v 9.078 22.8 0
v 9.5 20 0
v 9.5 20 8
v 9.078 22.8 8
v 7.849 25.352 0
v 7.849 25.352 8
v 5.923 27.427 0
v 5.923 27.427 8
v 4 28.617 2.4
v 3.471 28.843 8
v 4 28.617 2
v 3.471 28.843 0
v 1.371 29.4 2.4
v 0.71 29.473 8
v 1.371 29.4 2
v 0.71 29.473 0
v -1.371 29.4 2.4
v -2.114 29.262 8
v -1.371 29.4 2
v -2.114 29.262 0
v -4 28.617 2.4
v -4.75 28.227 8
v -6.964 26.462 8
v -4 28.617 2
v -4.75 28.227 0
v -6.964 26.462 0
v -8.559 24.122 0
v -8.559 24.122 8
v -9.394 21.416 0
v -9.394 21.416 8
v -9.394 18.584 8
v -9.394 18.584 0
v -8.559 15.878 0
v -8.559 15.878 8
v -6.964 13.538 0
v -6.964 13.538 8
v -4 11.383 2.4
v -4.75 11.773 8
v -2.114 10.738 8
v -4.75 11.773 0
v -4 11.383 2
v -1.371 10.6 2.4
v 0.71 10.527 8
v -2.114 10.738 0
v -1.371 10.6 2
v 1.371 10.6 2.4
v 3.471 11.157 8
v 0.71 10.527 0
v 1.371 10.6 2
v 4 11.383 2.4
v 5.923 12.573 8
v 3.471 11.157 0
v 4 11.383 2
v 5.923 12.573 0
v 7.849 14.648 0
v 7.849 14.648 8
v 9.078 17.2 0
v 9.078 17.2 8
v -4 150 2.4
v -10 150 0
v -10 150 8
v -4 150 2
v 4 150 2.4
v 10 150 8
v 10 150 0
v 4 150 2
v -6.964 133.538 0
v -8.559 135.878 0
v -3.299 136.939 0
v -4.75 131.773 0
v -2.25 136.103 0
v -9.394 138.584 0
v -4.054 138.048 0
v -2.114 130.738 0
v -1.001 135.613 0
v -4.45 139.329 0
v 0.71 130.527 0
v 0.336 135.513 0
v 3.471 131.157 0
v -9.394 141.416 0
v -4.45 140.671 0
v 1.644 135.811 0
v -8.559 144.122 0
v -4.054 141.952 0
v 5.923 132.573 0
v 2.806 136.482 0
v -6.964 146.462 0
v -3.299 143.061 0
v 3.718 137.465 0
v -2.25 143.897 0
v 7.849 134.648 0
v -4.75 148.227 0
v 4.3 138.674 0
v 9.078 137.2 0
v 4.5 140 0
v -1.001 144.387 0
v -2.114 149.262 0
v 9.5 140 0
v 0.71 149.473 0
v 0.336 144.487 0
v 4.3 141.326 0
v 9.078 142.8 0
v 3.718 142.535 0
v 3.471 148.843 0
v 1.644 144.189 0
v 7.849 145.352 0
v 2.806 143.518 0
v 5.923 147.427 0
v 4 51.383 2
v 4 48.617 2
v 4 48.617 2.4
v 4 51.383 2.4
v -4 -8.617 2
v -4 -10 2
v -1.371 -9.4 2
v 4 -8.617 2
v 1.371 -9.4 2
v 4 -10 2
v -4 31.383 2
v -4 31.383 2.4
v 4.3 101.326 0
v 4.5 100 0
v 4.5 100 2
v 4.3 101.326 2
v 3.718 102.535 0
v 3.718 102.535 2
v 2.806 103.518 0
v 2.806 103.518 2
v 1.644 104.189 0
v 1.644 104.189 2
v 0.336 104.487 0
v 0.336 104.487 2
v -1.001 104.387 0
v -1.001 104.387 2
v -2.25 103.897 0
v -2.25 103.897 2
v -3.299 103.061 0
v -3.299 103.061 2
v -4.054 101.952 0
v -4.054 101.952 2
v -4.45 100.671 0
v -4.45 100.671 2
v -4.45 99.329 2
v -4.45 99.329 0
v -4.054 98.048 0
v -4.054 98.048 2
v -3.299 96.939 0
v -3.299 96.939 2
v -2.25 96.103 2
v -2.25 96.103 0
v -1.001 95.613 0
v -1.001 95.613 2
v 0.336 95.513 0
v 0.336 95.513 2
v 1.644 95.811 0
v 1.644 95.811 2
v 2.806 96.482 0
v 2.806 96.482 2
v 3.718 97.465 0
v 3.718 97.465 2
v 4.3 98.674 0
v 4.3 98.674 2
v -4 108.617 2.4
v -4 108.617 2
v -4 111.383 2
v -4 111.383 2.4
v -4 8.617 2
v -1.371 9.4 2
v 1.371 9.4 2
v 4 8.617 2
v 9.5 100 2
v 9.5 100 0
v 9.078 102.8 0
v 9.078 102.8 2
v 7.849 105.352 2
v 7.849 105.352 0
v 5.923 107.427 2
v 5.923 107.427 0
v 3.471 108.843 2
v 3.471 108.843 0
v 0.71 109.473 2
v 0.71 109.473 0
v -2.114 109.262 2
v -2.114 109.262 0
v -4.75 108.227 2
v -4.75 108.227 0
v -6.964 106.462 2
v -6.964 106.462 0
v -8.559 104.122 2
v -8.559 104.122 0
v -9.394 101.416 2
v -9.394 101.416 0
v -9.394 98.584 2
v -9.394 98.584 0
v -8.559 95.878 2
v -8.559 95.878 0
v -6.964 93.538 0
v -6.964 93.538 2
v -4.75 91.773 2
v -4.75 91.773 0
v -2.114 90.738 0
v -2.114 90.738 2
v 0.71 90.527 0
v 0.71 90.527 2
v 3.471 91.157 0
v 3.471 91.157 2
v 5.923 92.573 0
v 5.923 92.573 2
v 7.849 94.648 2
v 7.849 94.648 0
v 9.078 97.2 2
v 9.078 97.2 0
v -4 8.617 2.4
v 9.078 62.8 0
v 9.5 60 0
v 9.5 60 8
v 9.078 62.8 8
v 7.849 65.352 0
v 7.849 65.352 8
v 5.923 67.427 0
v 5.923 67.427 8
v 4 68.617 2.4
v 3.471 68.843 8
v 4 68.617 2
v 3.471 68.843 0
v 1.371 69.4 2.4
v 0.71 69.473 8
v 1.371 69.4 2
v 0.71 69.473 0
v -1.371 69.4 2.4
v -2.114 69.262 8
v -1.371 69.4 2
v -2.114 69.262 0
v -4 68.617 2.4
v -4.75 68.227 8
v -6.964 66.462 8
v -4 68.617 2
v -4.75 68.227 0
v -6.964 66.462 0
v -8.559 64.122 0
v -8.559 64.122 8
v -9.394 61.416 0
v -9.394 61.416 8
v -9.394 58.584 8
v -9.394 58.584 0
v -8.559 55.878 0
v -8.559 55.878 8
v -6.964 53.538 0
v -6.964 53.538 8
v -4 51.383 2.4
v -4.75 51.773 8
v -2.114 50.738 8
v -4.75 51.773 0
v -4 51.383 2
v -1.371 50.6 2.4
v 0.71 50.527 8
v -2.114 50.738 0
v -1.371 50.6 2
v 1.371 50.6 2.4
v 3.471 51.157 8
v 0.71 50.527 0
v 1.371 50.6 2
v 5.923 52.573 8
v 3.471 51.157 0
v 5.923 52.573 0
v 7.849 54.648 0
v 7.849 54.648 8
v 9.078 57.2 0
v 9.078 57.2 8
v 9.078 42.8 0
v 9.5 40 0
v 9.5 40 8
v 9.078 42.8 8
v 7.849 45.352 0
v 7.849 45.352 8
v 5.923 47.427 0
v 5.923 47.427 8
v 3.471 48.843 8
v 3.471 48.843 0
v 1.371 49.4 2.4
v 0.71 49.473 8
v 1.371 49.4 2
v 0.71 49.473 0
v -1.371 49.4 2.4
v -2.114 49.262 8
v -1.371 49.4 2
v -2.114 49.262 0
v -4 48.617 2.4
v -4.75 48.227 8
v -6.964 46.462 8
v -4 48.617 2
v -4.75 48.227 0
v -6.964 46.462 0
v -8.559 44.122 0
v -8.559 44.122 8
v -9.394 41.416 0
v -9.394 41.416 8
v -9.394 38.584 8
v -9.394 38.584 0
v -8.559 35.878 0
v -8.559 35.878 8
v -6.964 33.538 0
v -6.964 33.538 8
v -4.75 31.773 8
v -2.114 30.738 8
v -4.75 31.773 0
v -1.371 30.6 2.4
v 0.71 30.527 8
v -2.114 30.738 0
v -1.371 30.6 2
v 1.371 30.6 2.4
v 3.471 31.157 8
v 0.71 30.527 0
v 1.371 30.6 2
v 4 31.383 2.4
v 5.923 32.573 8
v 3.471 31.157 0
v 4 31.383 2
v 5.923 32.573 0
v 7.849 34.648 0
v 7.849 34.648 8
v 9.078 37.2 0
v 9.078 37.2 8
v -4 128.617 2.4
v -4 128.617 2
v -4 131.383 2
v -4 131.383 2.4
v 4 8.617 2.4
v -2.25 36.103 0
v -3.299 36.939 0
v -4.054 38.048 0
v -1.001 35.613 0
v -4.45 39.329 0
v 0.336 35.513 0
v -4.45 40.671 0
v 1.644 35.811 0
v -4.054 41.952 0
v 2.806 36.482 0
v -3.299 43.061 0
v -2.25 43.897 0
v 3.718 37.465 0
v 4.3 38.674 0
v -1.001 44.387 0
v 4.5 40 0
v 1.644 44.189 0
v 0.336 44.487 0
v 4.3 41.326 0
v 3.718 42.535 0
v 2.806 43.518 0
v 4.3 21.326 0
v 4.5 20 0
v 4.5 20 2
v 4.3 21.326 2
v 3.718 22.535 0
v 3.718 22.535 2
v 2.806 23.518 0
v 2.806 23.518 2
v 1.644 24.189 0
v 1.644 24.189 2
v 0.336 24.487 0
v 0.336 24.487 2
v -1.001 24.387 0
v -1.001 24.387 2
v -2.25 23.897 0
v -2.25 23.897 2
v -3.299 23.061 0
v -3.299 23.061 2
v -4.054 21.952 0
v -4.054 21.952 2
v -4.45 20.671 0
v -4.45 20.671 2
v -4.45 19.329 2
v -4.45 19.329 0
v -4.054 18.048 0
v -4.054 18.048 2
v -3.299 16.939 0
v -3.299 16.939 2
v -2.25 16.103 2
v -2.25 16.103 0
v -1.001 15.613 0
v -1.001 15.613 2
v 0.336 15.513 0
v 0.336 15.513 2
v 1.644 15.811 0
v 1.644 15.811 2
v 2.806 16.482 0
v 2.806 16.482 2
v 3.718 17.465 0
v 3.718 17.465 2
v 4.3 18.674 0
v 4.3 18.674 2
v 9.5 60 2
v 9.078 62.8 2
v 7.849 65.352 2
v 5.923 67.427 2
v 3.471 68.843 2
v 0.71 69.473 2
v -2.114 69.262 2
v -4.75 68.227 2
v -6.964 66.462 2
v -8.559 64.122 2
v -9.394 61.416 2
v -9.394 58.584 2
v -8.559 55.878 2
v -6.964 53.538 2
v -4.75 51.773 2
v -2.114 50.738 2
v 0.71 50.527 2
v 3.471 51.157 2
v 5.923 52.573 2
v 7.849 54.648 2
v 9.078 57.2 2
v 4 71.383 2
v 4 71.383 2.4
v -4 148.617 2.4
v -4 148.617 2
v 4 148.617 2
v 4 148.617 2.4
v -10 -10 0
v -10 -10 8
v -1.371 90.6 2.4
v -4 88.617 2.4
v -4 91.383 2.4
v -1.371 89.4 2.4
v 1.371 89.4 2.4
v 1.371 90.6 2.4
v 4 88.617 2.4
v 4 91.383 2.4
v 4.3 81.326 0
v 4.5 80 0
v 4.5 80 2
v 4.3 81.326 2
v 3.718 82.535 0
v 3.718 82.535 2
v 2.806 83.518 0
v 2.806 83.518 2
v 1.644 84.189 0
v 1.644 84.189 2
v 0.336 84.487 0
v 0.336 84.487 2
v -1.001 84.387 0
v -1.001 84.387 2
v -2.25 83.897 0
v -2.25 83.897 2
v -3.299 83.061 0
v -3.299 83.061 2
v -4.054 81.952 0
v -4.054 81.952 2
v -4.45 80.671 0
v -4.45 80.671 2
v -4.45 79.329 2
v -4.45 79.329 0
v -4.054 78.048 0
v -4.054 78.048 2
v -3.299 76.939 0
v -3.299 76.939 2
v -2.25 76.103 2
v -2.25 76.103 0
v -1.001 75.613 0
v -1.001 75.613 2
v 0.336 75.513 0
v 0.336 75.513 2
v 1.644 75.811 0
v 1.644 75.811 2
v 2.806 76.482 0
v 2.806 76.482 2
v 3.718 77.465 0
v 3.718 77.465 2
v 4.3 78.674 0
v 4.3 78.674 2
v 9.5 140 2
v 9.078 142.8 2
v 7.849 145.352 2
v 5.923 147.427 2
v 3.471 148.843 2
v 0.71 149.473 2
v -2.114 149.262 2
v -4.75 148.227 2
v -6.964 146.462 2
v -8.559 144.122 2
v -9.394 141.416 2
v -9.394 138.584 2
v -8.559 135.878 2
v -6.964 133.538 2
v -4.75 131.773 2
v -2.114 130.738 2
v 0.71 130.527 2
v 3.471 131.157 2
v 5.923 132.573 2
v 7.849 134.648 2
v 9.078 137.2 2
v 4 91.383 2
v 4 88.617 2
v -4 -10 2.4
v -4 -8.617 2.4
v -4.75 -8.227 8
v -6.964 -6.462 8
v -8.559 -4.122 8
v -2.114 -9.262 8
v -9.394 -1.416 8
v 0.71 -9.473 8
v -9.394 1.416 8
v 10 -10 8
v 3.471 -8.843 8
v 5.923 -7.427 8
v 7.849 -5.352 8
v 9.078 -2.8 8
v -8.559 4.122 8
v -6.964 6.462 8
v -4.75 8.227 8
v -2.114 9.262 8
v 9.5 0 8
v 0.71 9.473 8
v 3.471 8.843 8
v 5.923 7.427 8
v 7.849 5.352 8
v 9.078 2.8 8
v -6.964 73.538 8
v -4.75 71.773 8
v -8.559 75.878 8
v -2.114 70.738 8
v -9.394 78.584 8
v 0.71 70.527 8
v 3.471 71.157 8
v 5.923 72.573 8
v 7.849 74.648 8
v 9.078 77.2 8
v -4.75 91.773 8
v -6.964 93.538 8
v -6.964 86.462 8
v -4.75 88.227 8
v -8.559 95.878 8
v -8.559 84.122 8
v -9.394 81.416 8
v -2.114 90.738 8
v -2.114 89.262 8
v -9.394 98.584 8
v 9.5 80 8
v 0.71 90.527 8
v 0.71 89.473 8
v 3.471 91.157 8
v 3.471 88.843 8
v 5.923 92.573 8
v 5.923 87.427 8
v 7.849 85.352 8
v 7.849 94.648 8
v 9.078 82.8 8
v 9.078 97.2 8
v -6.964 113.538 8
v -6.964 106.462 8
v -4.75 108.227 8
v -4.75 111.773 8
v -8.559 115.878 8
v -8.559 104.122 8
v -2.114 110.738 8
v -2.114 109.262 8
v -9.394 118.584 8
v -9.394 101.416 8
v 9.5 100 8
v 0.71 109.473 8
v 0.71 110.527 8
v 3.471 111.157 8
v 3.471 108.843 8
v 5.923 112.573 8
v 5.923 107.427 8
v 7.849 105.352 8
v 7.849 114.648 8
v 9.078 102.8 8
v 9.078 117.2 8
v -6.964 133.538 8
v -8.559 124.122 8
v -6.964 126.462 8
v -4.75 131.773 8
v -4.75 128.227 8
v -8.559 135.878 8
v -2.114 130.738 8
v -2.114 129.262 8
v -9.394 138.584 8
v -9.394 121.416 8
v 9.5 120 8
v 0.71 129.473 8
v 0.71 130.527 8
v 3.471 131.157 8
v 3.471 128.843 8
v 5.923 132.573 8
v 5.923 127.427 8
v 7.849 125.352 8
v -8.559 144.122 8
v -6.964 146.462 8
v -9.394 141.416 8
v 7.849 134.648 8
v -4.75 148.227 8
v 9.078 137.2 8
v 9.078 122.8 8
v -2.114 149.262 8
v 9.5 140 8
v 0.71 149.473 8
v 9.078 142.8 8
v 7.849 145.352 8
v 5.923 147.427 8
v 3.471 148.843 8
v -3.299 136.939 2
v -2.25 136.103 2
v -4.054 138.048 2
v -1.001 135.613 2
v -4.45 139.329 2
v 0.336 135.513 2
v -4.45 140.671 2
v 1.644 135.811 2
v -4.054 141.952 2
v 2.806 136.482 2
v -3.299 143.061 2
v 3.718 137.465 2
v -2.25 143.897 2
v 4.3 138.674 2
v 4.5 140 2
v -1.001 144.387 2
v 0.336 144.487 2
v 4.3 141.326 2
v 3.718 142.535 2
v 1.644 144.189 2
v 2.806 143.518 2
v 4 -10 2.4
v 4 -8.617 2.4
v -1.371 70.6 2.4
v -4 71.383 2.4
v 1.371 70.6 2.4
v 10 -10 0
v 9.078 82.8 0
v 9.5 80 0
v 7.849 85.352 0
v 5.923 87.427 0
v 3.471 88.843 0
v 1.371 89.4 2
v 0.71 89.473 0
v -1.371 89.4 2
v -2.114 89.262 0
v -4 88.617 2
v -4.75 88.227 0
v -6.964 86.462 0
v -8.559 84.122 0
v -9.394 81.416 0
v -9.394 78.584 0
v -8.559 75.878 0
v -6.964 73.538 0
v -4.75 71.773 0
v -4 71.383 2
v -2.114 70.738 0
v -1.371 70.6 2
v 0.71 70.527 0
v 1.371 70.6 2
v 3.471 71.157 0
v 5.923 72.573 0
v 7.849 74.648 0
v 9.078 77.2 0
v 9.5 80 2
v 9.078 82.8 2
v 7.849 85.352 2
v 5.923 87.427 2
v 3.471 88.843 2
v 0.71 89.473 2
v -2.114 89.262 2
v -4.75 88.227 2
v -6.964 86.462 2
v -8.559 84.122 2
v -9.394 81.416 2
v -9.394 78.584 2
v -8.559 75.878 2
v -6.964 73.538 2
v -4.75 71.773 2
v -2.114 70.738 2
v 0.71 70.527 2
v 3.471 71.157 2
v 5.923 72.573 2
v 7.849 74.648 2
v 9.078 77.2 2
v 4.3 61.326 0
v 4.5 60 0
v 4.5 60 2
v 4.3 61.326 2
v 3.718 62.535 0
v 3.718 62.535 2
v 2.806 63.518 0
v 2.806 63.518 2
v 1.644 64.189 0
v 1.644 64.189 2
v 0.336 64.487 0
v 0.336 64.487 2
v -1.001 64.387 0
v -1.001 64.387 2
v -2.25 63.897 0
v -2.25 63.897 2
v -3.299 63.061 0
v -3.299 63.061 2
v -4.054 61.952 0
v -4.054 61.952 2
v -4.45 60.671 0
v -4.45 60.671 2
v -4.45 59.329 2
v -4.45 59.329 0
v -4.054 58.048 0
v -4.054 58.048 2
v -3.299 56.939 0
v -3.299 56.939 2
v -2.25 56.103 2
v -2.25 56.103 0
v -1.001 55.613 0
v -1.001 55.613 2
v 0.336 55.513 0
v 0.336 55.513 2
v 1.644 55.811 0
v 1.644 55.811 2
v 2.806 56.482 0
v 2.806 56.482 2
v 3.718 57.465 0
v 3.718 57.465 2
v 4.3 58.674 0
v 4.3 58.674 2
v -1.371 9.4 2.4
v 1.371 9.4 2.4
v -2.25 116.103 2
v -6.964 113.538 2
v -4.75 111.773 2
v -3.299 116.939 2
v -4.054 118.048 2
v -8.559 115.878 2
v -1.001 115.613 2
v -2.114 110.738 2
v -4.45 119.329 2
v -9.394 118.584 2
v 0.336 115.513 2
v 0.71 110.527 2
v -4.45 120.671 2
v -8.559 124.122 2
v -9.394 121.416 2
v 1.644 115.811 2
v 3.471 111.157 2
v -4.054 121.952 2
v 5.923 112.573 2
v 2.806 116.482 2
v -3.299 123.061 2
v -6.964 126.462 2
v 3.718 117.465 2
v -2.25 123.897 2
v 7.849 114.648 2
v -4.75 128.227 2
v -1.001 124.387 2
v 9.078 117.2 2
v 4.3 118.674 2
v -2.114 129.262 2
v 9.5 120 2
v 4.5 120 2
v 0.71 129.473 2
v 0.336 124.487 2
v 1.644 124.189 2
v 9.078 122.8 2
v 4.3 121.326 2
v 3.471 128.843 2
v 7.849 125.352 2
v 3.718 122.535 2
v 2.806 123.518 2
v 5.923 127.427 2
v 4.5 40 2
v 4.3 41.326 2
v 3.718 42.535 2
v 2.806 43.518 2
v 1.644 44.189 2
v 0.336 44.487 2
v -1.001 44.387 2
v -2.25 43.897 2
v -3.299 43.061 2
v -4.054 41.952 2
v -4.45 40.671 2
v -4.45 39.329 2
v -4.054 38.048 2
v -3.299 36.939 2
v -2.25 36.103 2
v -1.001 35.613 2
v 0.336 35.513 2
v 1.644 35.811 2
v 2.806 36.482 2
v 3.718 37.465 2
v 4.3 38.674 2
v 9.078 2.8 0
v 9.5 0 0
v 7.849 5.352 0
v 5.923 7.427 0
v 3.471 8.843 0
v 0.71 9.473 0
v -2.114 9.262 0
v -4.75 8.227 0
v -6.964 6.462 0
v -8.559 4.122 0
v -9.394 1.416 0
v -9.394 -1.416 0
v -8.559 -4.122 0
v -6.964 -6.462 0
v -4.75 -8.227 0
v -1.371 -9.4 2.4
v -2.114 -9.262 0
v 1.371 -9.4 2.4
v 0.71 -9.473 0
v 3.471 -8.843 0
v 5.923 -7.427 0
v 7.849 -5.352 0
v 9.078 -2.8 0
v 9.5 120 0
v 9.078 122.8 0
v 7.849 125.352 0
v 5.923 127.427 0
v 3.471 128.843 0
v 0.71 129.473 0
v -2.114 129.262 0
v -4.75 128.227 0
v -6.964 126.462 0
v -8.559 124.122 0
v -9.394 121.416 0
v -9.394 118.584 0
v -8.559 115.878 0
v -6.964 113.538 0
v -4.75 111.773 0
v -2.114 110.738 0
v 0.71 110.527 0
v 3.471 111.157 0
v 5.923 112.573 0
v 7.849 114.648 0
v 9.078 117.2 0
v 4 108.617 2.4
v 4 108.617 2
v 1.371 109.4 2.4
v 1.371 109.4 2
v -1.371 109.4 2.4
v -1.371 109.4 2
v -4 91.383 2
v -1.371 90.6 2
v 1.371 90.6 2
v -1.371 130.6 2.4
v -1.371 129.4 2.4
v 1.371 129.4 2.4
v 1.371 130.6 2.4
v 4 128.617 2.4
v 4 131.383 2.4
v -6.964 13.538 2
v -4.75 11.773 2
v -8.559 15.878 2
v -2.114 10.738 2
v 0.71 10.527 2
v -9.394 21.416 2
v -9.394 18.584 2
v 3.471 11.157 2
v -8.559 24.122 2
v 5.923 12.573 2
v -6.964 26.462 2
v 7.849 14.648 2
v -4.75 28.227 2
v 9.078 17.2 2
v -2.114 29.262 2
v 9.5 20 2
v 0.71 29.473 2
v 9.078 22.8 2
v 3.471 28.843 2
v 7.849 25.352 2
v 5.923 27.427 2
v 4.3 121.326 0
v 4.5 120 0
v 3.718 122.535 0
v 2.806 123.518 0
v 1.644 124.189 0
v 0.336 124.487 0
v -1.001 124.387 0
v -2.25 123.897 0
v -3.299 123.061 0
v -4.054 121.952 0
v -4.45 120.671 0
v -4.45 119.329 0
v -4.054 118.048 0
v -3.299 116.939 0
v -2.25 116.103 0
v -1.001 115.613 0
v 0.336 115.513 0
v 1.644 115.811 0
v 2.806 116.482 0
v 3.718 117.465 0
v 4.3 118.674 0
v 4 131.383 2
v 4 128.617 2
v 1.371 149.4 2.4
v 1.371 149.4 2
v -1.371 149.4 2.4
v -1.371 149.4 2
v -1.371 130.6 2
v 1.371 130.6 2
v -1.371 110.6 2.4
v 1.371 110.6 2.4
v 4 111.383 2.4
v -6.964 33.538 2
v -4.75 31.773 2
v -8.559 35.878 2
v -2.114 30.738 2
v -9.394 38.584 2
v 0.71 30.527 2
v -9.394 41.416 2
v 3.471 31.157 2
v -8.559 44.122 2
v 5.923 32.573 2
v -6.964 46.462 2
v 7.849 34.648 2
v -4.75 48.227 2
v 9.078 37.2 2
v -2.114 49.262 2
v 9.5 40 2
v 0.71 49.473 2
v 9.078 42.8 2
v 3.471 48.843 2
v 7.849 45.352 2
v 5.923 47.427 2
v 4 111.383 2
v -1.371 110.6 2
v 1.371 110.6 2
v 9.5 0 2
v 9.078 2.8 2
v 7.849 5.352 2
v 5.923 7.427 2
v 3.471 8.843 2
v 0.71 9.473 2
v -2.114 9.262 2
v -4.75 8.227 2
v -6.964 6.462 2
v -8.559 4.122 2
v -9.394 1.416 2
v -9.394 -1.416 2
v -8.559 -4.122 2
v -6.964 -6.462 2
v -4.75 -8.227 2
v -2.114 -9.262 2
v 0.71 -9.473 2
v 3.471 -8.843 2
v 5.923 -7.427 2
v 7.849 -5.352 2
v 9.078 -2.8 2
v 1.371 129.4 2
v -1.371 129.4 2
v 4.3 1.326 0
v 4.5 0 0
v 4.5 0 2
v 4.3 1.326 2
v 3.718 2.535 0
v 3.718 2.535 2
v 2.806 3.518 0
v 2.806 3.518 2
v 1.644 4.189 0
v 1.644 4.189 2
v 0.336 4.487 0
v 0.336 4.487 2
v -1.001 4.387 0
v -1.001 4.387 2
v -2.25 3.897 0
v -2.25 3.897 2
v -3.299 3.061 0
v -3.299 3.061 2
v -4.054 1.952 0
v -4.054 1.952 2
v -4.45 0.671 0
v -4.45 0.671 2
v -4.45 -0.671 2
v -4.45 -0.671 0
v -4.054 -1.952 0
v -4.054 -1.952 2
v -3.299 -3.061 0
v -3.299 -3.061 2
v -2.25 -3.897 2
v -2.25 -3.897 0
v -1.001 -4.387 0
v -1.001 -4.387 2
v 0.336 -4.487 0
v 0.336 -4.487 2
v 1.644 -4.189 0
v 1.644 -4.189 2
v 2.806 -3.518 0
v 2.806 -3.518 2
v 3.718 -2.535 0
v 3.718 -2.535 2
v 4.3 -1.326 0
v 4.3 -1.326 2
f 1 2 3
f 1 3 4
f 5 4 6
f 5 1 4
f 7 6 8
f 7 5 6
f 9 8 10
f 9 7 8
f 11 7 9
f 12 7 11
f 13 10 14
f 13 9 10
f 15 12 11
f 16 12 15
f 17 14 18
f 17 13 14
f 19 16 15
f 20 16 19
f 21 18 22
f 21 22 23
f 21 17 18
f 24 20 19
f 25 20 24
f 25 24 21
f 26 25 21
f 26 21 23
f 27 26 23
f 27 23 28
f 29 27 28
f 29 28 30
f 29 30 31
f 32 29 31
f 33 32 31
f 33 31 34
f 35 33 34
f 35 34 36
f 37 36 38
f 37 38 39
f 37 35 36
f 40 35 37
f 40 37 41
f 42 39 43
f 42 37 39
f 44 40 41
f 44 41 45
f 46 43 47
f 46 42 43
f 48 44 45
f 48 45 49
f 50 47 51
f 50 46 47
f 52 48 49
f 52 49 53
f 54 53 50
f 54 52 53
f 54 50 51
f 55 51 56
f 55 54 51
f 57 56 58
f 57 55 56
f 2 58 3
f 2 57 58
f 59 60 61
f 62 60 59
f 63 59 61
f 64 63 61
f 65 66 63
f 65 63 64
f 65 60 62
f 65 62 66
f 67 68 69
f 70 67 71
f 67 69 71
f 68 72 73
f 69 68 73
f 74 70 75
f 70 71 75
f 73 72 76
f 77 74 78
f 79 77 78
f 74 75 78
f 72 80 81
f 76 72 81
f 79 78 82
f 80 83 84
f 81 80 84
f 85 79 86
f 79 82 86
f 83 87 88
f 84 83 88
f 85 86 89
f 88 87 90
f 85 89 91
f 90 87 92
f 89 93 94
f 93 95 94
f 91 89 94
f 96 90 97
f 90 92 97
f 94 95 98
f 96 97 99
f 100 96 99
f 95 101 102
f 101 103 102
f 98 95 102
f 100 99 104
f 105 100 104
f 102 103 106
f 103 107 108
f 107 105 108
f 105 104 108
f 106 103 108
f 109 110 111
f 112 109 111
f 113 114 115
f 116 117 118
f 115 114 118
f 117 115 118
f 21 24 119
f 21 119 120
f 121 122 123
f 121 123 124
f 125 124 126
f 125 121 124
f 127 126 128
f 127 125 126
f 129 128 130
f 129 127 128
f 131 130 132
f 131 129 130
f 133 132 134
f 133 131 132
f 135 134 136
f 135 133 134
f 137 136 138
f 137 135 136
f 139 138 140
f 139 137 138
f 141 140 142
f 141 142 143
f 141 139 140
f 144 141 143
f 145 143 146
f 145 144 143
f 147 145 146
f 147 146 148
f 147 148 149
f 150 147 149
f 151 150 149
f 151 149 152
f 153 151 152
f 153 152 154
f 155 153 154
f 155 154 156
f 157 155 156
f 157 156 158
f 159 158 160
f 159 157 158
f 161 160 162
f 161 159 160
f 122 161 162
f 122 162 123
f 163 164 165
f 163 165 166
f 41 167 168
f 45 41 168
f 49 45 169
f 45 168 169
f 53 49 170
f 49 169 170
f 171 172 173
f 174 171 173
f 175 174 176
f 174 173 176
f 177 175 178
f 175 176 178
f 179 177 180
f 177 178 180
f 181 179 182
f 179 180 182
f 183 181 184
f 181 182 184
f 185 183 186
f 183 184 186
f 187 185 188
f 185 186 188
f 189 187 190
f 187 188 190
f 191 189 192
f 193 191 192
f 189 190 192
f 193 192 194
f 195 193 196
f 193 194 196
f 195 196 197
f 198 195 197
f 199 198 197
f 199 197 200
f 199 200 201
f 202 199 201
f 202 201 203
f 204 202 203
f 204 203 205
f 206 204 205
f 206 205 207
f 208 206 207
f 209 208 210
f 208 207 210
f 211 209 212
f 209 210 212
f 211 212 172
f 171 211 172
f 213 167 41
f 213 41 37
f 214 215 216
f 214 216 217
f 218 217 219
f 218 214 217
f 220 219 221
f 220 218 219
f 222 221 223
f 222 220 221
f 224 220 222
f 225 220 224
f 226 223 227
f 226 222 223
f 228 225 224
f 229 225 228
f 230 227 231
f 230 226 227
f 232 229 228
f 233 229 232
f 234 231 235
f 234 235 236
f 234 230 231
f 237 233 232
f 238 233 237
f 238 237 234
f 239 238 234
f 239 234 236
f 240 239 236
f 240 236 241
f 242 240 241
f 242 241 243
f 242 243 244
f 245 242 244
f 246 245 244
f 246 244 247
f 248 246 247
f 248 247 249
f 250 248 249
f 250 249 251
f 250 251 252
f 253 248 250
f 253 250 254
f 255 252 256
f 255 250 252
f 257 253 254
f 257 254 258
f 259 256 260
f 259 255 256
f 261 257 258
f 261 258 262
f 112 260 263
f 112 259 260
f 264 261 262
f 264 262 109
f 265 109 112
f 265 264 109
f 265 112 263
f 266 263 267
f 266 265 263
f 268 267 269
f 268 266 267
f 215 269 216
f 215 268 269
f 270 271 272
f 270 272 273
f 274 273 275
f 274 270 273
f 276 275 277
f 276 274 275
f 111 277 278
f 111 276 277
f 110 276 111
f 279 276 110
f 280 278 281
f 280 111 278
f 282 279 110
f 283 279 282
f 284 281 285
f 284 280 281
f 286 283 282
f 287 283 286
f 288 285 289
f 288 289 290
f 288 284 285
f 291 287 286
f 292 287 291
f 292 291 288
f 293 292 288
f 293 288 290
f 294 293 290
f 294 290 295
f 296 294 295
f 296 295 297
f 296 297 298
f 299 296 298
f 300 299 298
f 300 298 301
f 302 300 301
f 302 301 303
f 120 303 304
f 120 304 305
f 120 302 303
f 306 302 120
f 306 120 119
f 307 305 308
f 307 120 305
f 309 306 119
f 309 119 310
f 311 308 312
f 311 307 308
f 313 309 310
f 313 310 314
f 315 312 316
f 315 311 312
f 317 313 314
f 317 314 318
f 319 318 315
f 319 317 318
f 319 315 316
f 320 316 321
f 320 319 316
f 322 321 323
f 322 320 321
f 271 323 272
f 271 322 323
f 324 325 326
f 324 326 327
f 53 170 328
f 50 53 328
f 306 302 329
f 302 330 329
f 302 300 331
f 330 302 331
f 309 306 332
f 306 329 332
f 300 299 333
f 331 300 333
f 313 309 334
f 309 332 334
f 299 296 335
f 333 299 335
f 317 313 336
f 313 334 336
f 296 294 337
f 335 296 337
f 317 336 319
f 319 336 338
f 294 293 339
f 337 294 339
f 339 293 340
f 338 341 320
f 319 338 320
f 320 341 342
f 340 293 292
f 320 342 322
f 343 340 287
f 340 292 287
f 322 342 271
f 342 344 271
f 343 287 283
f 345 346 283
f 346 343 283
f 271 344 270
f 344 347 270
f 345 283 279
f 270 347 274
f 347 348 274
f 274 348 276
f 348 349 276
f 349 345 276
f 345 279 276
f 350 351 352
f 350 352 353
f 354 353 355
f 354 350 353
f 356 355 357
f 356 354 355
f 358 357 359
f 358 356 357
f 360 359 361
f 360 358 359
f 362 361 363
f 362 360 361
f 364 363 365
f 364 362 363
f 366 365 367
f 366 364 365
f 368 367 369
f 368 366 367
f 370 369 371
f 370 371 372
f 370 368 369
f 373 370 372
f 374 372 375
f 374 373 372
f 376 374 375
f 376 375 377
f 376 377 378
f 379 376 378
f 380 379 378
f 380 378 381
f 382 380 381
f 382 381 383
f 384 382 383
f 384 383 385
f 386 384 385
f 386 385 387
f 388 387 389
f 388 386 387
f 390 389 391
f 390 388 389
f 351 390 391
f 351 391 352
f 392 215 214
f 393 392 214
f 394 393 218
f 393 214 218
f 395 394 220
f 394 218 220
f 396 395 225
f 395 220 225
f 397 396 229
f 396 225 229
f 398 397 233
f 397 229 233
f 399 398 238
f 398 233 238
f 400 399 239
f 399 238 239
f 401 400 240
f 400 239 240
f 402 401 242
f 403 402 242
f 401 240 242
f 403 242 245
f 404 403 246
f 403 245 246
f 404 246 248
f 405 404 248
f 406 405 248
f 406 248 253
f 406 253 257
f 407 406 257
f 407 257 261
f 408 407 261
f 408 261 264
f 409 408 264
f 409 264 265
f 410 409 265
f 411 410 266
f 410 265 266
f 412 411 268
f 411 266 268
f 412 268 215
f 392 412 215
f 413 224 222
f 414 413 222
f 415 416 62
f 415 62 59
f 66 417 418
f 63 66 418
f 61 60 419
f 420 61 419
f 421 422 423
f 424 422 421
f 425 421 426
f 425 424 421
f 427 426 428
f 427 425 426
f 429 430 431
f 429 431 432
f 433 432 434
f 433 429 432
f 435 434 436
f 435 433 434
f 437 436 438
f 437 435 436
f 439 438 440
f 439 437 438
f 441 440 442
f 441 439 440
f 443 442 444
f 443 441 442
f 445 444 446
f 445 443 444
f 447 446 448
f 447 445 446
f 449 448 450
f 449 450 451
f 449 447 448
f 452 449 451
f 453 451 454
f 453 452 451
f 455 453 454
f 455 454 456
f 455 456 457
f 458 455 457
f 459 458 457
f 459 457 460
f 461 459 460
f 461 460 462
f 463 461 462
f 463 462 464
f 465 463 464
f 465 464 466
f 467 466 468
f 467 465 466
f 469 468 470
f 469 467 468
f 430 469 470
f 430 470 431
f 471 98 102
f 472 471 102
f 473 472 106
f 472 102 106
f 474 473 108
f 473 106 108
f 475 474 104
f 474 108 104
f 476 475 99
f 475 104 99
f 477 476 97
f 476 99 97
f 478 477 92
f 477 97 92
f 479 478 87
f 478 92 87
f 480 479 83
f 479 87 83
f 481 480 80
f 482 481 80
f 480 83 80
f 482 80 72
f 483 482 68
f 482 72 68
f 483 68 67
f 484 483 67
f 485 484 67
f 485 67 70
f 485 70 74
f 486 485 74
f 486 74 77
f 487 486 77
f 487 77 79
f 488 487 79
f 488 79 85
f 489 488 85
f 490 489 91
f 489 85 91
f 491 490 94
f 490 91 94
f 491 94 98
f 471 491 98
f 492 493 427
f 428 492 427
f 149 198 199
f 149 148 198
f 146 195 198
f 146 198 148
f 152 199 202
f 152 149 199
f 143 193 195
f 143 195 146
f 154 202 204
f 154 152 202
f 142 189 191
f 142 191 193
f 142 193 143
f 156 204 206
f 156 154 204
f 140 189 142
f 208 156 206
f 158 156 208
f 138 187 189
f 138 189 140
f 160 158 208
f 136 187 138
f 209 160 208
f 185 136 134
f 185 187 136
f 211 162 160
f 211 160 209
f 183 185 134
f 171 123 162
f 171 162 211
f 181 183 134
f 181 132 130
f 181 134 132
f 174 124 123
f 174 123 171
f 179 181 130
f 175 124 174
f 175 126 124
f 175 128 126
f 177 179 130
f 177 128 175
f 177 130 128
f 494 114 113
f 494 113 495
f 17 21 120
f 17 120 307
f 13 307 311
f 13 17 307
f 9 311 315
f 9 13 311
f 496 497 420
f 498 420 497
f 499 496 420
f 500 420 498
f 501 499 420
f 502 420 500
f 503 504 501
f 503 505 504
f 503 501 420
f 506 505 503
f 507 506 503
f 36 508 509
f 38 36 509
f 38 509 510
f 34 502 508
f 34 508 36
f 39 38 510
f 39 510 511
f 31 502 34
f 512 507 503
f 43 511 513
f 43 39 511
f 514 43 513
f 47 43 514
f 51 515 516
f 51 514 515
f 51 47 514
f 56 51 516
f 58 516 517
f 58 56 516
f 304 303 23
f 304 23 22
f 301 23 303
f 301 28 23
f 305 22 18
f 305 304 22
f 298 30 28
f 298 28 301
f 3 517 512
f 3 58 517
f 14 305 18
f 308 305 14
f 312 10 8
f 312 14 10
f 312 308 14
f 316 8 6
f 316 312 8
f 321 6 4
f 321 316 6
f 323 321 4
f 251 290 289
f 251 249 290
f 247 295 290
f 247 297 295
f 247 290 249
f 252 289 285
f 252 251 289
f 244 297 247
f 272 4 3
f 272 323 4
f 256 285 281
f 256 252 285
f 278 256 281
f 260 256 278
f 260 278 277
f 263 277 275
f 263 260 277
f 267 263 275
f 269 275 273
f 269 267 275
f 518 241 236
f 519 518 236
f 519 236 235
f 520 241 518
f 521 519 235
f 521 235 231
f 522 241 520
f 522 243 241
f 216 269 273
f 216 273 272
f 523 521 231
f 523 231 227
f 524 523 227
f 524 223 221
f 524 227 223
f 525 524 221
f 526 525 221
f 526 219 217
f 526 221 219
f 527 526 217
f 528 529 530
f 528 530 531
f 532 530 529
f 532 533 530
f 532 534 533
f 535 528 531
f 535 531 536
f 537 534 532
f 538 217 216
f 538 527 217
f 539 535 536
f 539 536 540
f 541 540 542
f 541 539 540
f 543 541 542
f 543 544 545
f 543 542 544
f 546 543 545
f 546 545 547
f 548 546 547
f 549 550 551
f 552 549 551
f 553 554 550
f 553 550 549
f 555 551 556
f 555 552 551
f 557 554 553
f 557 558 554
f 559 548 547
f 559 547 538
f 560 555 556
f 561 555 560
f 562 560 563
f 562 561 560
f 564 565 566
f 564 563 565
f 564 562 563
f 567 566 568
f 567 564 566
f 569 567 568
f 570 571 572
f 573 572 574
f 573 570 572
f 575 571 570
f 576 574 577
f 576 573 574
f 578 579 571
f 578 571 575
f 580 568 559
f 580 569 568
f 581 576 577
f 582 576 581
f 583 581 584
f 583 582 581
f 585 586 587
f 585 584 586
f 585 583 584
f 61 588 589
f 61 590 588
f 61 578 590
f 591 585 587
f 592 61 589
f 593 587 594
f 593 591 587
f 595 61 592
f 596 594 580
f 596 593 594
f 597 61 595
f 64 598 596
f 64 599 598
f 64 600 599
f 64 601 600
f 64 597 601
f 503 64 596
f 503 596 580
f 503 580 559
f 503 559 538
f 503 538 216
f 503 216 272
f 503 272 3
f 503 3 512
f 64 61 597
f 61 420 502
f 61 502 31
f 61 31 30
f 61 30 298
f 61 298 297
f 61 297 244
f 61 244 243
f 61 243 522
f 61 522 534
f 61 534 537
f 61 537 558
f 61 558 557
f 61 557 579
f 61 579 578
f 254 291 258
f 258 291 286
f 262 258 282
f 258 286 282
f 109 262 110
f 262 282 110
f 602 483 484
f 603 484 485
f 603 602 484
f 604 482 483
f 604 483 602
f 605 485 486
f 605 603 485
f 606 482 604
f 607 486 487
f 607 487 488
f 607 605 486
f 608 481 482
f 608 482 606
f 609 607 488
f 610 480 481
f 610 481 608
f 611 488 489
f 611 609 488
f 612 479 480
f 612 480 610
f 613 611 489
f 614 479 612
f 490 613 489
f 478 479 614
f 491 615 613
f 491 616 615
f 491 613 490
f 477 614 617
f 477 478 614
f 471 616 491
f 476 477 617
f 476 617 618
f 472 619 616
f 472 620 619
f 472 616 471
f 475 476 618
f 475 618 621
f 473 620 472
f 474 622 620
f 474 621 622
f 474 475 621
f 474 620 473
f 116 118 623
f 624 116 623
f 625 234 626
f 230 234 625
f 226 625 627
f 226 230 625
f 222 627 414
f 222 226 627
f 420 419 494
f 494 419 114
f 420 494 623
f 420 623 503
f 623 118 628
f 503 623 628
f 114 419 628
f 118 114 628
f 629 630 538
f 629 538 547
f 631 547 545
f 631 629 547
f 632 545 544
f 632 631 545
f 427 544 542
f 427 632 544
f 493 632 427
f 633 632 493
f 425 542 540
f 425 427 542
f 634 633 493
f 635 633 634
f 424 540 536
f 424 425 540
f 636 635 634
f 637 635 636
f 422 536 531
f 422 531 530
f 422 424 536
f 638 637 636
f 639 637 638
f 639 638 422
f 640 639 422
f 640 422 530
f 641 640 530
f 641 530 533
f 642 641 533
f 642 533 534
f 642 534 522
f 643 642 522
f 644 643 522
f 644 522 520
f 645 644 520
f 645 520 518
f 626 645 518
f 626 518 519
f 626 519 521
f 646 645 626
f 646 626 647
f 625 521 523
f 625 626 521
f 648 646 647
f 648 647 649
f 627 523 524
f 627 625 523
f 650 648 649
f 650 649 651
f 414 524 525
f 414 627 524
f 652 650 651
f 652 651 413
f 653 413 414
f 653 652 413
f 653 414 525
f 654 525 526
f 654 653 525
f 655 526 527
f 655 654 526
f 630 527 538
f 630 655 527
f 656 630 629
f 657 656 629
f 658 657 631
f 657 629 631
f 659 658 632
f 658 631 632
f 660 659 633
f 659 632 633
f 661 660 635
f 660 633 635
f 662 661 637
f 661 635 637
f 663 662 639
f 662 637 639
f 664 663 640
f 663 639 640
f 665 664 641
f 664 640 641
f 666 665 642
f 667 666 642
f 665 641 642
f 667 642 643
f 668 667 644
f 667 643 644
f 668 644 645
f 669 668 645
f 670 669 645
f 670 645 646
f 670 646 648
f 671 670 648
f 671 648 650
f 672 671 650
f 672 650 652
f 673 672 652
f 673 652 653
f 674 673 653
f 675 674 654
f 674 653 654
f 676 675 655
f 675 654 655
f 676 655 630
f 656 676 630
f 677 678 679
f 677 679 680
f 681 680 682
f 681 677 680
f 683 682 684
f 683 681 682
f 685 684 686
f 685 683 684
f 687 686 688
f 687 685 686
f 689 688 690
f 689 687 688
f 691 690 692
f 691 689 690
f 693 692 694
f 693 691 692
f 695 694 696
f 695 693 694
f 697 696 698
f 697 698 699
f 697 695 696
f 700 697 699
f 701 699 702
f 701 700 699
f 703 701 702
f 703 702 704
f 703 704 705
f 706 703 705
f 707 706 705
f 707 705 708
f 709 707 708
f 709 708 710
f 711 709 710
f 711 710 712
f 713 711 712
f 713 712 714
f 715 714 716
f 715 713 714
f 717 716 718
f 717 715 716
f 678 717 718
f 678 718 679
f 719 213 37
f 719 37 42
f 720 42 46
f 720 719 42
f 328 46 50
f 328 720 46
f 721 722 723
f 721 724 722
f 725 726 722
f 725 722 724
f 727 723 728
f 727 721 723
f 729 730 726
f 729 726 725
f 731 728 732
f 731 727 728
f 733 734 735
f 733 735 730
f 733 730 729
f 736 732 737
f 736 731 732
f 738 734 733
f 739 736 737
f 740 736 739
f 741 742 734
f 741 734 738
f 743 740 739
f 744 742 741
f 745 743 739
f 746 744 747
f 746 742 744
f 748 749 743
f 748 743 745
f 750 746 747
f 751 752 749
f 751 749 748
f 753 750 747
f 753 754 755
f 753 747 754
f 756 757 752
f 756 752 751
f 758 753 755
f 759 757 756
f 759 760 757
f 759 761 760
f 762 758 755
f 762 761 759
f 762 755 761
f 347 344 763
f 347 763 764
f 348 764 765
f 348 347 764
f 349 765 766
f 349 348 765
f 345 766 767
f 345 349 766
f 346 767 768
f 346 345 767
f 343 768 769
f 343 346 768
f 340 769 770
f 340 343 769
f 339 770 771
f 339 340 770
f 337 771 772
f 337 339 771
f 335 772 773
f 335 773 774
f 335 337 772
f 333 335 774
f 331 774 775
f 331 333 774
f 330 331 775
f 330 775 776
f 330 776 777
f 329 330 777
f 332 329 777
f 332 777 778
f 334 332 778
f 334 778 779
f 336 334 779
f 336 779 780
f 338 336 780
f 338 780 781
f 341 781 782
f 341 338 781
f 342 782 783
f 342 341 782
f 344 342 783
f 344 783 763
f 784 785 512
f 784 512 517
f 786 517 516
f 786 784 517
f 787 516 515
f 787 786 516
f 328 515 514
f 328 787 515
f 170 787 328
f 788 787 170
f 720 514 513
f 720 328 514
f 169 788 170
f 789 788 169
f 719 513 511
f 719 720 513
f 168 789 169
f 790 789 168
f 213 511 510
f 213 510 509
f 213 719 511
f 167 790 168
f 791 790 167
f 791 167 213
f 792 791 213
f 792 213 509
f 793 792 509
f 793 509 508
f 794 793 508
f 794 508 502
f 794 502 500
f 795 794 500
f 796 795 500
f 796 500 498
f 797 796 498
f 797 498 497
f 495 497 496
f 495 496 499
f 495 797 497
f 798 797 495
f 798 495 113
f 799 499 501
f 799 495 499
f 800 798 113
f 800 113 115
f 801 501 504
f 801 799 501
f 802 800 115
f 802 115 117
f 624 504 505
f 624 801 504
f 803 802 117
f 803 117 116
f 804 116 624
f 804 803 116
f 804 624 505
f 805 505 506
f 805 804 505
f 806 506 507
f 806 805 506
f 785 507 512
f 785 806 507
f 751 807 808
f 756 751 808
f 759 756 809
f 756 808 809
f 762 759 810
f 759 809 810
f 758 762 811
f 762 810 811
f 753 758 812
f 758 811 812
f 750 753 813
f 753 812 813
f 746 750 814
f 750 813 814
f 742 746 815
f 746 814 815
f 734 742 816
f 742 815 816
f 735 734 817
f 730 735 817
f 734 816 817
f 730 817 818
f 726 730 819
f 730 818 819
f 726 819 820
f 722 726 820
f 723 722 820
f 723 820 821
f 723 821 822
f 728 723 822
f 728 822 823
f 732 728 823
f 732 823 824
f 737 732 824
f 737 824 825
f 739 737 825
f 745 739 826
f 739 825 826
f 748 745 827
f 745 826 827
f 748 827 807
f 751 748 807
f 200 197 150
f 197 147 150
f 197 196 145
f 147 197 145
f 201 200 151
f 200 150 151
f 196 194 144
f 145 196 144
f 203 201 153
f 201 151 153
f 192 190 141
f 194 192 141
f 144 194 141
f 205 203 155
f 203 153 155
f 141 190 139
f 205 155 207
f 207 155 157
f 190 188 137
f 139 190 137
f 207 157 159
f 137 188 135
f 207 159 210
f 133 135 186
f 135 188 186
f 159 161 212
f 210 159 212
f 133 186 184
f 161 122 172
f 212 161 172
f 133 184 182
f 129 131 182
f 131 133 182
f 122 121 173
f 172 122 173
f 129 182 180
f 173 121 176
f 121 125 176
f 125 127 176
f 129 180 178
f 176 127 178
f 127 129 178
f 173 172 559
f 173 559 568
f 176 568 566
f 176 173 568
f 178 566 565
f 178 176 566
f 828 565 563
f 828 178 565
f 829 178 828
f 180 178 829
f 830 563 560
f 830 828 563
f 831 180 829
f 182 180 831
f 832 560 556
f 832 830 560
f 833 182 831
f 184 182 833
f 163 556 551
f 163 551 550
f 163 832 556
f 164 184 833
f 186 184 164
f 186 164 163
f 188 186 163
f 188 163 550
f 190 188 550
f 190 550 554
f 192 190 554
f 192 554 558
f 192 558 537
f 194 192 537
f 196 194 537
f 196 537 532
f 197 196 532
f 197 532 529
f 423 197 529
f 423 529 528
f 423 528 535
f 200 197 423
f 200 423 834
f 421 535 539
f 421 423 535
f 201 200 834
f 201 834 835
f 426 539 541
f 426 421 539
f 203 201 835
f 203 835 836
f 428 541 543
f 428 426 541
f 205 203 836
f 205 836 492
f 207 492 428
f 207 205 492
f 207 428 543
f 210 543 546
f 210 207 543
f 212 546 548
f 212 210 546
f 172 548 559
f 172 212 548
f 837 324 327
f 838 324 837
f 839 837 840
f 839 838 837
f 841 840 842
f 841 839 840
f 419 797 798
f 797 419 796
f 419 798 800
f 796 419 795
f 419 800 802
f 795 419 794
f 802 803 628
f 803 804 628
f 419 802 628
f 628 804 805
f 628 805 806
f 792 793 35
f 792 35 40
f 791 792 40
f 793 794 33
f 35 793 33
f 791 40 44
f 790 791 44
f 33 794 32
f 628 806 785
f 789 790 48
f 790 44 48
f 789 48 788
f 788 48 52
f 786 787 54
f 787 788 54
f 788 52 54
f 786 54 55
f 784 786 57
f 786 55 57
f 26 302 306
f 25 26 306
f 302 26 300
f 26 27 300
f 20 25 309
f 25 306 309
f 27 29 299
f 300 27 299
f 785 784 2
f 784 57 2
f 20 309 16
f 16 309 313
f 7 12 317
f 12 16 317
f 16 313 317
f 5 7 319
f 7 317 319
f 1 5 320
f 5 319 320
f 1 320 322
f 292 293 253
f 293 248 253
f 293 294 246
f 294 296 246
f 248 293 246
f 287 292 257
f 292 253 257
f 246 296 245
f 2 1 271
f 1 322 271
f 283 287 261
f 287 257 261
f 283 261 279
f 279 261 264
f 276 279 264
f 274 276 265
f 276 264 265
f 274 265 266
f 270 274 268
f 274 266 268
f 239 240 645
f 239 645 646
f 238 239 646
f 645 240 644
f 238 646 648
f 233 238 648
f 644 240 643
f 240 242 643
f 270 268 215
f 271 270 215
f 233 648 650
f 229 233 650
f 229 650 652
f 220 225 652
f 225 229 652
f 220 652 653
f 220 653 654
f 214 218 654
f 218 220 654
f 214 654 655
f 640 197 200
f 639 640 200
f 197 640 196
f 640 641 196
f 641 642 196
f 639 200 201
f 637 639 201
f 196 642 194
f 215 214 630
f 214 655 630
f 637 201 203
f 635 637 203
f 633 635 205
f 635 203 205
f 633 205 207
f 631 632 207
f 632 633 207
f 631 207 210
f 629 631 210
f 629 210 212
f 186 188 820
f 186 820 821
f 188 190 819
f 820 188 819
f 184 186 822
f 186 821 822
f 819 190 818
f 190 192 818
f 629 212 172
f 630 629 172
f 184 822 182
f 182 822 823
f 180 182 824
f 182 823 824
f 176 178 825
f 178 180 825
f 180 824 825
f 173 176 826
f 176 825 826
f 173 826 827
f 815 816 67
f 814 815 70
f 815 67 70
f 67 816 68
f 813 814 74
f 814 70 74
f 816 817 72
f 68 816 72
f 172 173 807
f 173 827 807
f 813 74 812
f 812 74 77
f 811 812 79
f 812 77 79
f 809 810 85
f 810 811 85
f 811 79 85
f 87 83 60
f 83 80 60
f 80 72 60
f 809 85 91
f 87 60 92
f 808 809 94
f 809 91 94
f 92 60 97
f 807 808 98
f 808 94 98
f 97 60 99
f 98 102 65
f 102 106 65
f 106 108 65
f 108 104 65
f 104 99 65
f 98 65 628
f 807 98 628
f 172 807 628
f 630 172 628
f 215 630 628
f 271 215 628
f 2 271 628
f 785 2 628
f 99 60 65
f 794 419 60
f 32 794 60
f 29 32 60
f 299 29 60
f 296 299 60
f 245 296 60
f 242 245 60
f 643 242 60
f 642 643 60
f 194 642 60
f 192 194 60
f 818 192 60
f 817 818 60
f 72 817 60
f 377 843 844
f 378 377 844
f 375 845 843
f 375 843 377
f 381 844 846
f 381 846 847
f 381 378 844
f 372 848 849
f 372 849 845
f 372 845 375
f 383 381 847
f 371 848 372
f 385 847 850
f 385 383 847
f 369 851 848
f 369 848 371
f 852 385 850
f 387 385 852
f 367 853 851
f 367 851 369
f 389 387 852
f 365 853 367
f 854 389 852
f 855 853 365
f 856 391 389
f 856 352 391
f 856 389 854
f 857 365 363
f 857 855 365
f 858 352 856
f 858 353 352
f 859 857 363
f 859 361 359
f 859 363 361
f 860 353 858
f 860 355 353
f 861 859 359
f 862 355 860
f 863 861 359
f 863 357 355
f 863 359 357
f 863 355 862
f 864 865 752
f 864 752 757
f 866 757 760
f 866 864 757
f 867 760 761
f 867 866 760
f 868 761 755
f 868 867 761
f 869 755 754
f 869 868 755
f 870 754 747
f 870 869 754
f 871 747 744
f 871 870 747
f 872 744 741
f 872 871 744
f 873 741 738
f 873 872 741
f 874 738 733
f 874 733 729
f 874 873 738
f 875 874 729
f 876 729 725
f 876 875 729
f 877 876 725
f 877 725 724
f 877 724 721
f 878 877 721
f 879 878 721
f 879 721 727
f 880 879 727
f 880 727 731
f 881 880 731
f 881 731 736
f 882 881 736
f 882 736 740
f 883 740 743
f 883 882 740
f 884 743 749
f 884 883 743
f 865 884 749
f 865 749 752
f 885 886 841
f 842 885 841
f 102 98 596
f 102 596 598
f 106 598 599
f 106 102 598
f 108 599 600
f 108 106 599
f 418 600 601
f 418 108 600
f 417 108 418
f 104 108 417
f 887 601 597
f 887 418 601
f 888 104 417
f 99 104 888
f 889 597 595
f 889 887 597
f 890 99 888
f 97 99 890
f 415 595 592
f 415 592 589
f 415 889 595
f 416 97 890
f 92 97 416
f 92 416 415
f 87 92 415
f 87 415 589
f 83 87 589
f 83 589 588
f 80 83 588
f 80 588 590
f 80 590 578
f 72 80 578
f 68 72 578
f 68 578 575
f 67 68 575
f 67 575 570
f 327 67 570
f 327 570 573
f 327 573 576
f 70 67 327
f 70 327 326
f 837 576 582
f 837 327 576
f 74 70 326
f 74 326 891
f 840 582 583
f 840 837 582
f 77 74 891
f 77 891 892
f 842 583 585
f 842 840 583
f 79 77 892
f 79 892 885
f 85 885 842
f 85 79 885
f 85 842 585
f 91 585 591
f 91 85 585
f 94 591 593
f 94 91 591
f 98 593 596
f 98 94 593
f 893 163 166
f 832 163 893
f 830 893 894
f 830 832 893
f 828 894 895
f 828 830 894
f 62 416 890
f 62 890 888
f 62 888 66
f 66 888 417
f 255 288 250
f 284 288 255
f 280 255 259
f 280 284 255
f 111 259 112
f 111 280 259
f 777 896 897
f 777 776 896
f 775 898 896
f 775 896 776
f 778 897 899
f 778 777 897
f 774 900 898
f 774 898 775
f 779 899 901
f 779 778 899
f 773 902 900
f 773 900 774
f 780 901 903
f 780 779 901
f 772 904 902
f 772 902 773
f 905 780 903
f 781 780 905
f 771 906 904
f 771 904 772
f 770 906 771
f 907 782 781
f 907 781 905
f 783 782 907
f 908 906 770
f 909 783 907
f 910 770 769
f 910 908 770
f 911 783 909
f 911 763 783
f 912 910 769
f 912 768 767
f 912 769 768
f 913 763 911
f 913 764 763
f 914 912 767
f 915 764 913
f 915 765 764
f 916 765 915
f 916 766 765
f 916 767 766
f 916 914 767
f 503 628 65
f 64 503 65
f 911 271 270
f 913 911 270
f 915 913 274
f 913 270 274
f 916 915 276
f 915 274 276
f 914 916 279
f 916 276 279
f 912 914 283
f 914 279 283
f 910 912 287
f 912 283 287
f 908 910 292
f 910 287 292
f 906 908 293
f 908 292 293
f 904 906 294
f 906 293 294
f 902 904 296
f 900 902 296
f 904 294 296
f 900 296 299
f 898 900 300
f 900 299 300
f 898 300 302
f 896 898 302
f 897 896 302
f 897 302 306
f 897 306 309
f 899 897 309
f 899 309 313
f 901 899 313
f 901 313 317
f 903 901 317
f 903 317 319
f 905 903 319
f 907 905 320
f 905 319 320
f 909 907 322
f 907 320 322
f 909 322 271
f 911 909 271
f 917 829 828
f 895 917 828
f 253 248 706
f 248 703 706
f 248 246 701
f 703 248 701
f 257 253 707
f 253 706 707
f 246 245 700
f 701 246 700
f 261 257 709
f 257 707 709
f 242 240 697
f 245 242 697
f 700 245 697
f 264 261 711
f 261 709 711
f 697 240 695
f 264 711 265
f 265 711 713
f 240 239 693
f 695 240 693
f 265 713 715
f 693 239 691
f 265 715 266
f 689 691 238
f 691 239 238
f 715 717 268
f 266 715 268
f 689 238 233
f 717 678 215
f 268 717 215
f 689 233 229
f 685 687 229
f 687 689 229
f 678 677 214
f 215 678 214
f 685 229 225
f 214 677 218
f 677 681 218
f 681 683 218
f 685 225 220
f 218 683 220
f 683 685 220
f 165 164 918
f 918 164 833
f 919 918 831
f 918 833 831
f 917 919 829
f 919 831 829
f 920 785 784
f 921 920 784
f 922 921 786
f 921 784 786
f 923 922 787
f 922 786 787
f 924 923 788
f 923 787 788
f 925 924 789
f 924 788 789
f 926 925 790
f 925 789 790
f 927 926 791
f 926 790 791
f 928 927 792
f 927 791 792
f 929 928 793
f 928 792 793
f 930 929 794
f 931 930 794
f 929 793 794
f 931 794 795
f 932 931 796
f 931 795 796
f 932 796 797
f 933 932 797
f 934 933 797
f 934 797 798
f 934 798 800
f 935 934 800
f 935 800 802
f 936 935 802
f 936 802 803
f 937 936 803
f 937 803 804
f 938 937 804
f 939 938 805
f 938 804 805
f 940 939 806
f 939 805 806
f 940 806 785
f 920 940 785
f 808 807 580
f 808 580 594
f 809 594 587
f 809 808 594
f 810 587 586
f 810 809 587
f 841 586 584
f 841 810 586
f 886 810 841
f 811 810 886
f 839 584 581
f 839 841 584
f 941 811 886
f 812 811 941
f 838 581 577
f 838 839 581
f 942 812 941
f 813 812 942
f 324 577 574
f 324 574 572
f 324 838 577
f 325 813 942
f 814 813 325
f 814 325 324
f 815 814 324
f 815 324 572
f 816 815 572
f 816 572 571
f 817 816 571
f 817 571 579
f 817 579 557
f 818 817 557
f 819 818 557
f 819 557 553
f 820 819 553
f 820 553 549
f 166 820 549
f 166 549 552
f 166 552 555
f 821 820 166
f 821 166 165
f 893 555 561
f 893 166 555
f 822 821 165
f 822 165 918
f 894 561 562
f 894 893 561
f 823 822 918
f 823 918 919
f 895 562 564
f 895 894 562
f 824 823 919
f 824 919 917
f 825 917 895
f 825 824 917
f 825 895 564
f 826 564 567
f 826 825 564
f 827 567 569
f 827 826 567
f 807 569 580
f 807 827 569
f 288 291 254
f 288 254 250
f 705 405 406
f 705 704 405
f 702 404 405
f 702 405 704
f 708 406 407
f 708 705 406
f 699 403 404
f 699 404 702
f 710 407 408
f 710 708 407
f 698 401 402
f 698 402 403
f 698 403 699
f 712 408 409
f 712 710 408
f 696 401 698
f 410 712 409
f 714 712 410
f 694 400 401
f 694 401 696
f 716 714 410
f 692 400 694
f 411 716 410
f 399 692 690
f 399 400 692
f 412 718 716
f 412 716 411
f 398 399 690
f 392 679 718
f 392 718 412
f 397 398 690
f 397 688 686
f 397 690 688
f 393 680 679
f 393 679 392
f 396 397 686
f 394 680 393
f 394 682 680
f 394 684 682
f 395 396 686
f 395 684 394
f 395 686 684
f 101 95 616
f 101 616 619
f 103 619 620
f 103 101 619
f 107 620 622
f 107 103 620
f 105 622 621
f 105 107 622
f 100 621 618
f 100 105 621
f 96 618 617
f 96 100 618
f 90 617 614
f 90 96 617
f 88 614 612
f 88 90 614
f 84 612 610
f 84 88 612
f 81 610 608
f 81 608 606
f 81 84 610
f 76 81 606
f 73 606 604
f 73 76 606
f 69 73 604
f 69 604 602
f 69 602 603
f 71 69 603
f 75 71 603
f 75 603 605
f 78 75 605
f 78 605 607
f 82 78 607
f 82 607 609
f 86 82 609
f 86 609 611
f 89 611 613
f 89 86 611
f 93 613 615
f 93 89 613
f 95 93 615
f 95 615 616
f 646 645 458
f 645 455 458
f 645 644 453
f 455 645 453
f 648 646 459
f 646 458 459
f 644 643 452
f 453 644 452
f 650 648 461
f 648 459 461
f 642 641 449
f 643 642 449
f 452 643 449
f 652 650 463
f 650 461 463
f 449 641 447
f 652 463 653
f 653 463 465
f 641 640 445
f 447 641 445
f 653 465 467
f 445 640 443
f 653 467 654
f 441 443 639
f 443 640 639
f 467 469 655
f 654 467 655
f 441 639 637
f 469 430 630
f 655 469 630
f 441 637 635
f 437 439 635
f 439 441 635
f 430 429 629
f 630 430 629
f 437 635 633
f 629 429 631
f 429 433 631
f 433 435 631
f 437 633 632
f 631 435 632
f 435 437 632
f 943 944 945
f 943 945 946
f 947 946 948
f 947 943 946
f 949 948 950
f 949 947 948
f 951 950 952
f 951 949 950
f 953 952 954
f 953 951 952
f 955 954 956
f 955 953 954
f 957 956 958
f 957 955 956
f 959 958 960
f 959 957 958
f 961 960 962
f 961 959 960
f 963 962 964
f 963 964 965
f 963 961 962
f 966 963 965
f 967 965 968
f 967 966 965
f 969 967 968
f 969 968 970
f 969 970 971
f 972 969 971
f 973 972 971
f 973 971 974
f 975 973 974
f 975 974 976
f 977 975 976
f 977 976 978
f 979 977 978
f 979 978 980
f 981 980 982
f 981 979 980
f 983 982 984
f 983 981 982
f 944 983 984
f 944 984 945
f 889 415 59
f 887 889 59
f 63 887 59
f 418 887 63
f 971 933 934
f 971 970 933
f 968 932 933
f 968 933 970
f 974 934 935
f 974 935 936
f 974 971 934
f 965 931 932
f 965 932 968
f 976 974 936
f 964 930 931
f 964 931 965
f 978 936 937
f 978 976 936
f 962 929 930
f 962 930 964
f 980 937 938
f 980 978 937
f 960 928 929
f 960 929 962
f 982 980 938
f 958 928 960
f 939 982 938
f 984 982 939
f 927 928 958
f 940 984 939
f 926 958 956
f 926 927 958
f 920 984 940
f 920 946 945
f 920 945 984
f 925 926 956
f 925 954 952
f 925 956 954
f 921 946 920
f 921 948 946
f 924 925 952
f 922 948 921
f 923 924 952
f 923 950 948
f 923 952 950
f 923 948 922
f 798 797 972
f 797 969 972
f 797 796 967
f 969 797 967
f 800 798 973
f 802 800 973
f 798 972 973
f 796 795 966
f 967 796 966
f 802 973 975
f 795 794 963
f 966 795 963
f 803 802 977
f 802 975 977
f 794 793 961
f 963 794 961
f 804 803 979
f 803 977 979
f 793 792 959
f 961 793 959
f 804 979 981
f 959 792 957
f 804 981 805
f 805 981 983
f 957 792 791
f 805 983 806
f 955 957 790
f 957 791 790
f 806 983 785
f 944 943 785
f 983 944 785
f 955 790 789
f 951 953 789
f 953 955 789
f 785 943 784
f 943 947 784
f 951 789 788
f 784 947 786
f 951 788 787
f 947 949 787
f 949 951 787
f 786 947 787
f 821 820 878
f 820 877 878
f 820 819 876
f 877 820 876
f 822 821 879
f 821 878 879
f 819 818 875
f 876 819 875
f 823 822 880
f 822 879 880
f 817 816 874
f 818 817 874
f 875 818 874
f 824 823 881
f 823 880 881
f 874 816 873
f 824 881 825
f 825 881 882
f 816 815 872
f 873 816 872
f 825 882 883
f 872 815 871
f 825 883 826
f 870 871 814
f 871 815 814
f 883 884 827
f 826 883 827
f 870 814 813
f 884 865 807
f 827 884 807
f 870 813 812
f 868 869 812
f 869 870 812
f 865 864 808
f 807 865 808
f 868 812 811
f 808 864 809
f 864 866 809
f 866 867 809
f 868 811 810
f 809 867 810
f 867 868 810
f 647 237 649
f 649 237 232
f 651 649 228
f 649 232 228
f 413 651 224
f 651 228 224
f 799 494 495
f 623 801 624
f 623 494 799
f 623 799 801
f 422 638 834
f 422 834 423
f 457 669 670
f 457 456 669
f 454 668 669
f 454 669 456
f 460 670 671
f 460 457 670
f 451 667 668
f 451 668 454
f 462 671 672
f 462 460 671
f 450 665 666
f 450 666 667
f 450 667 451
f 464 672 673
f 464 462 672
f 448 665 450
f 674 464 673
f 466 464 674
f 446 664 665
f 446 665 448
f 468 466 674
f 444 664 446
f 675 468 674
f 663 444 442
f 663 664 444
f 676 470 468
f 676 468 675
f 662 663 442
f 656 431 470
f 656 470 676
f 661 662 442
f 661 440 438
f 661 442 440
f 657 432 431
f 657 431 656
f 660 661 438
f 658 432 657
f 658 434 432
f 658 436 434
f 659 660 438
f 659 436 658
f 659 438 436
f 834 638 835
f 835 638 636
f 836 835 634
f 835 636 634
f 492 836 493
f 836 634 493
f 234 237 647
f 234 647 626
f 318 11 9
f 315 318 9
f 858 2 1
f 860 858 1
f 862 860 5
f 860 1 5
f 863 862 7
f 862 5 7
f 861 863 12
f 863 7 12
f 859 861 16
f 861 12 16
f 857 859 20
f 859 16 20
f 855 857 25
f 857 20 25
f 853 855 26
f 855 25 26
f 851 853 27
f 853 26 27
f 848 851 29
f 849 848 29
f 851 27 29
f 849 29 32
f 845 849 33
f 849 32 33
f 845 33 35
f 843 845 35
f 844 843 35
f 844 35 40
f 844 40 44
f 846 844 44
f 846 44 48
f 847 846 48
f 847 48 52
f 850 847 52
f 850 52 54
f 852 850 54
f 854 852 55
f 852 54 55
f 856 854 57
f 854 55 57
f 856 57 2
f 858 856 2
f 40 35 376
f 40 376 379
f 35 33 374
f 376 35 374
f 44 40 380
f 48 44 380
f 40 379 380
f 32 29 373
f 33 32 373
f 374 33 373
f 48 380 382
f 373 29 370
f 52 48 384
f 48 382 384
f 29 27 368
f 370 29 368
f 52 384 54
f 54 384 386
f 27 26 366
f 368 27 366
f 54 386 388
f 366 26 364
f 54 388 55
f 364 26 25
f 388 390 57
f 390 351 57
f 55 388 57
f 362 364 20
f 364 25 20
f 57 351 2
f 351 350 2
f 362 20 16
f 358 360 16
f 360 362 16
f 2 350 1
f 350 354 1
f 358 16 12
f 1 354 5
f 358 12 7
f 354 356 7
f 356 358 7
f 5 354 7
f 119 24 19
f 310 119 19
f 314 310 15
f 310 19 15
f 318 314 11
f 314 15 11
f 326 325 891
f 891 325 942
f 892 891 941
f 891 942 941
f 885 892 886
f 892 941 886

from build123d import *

# Parameters (mm, degrees)
F0_R     = 9.5
F0_R_2   = 4.5
F1_DEPTH = 2
F0_W     = 20
F0_H     = 20
F2_DEPTH = 8
F3_W     = 8
F3_H     = 0.4
F4_DEPTH = 160.001


with BuildPart() as f1:
    # F0 (on Top) → F1 (new body)
    with BuildSketch(Plane.XY):
        Circle(F0_R)
        Circle(F0_R_2, mode=Mode.SUBTRACT)
        with Locations((0, 20)):
            Circle(F0_R)
        with Locations((0, 20)):
            Circle(F0_R_2, mode=Mode.SUBTRACT)
        with Locations((0, 40)):
            Circle(F0_R)
        with Locations((0, 40)):
            Circle(F0_R_2, mode=Mode.SUBTRACT)
        with Locations((0, 60)):
            Circle(F0_R)
        with Locations((0, 60)):
            Circle(F0_R_2, mode=Mode.SUBTRACT)
        with Locations((0, 80)):
            Circle(F0_R)
        with Locations((0, 80)):
            Circle(F0_R_2, mode=Mode.SUBTRACT)
        with Locations((0, 100)):
            Circle(F0_R)
        with Locations((0, 100)):
            Circle(F0_R_2, mode=Mode.SUBTRACT)
        with Locations((0, 120)):
            Circle(F0_R)
        with Locations((0, 120)):
            Circle(F0_R_2, mode=Mode.SUBTRACT)
        with Locations((0, 140)):
            Circle(F0_R)
        with Locations((0, 140)):
            Circle(F0_R_2, mode=Mode.SUBTRACT)
    extrude(amount=F1_DEPTH)


with BuildPart() as f2:
    # F0 (on Top) → F2 (new body)
    with BuildSketch(Plane.XY):
        Rectangle(F0_W, F0_H)
        Circle(F0_R, mode=Mode.SUBTRACT)
        with Locations((0, 20)):
            Rectangle(F0_W, F0_H)
        with Locations((0, 20)):
            Circle(F0_R, mode=Mode.SUBTRACT)
        with Locations((0, 40)):
            Rectangle(F0_W, F0_H)
        with Locations((0, 40)):
            Circle(F0_R, mode=Mode.SUBTRACT)
        with Locations((0, 60)):
            Rectangle(F0_W, F0_H)
        with Locations((0, 60)):
            Circle(F0_R, mode=Mode.SUBTRACT)
        with Locations((0, 80)):
            Rectangle(F0_W, F0_H)
        with Locations((0, 80)):
            Circle(F0_R, mode=Mode.SUBTRACT)
        with Locations((0, 100)):
            Rectangle(F0_W, F0_H)
        with Locations((0, 100)):
            Circle(F0_R, mode=Mode.SUBTRACT)
        with Locations((0, 120)):
            Rectangle(F0_W, F0_H)
        with Locations((0, 120)):
            Circle(F0_R, mode=Mode.SUBTRACT)
        with Locations((0, 140)):
            Rectangle(F0_W, F0_H)
        with Locations((0, 140)):
            Circle(F0_R, mode=Mode.SUBTRACT)
    extrude(amount=F2_DEPTH)

    # F3 (on face) → F4 (cut, through all)
    with BuildSketch(Plane.XZ.offset(10)):
        with Locations((0, 2.2)):
            Rectangle(F3_W, F3_H)
    extrude(amount=-F4_DEPTH, mode=Mode.SUBTRACT)


solid = Compound([f1.part, f2.part])
